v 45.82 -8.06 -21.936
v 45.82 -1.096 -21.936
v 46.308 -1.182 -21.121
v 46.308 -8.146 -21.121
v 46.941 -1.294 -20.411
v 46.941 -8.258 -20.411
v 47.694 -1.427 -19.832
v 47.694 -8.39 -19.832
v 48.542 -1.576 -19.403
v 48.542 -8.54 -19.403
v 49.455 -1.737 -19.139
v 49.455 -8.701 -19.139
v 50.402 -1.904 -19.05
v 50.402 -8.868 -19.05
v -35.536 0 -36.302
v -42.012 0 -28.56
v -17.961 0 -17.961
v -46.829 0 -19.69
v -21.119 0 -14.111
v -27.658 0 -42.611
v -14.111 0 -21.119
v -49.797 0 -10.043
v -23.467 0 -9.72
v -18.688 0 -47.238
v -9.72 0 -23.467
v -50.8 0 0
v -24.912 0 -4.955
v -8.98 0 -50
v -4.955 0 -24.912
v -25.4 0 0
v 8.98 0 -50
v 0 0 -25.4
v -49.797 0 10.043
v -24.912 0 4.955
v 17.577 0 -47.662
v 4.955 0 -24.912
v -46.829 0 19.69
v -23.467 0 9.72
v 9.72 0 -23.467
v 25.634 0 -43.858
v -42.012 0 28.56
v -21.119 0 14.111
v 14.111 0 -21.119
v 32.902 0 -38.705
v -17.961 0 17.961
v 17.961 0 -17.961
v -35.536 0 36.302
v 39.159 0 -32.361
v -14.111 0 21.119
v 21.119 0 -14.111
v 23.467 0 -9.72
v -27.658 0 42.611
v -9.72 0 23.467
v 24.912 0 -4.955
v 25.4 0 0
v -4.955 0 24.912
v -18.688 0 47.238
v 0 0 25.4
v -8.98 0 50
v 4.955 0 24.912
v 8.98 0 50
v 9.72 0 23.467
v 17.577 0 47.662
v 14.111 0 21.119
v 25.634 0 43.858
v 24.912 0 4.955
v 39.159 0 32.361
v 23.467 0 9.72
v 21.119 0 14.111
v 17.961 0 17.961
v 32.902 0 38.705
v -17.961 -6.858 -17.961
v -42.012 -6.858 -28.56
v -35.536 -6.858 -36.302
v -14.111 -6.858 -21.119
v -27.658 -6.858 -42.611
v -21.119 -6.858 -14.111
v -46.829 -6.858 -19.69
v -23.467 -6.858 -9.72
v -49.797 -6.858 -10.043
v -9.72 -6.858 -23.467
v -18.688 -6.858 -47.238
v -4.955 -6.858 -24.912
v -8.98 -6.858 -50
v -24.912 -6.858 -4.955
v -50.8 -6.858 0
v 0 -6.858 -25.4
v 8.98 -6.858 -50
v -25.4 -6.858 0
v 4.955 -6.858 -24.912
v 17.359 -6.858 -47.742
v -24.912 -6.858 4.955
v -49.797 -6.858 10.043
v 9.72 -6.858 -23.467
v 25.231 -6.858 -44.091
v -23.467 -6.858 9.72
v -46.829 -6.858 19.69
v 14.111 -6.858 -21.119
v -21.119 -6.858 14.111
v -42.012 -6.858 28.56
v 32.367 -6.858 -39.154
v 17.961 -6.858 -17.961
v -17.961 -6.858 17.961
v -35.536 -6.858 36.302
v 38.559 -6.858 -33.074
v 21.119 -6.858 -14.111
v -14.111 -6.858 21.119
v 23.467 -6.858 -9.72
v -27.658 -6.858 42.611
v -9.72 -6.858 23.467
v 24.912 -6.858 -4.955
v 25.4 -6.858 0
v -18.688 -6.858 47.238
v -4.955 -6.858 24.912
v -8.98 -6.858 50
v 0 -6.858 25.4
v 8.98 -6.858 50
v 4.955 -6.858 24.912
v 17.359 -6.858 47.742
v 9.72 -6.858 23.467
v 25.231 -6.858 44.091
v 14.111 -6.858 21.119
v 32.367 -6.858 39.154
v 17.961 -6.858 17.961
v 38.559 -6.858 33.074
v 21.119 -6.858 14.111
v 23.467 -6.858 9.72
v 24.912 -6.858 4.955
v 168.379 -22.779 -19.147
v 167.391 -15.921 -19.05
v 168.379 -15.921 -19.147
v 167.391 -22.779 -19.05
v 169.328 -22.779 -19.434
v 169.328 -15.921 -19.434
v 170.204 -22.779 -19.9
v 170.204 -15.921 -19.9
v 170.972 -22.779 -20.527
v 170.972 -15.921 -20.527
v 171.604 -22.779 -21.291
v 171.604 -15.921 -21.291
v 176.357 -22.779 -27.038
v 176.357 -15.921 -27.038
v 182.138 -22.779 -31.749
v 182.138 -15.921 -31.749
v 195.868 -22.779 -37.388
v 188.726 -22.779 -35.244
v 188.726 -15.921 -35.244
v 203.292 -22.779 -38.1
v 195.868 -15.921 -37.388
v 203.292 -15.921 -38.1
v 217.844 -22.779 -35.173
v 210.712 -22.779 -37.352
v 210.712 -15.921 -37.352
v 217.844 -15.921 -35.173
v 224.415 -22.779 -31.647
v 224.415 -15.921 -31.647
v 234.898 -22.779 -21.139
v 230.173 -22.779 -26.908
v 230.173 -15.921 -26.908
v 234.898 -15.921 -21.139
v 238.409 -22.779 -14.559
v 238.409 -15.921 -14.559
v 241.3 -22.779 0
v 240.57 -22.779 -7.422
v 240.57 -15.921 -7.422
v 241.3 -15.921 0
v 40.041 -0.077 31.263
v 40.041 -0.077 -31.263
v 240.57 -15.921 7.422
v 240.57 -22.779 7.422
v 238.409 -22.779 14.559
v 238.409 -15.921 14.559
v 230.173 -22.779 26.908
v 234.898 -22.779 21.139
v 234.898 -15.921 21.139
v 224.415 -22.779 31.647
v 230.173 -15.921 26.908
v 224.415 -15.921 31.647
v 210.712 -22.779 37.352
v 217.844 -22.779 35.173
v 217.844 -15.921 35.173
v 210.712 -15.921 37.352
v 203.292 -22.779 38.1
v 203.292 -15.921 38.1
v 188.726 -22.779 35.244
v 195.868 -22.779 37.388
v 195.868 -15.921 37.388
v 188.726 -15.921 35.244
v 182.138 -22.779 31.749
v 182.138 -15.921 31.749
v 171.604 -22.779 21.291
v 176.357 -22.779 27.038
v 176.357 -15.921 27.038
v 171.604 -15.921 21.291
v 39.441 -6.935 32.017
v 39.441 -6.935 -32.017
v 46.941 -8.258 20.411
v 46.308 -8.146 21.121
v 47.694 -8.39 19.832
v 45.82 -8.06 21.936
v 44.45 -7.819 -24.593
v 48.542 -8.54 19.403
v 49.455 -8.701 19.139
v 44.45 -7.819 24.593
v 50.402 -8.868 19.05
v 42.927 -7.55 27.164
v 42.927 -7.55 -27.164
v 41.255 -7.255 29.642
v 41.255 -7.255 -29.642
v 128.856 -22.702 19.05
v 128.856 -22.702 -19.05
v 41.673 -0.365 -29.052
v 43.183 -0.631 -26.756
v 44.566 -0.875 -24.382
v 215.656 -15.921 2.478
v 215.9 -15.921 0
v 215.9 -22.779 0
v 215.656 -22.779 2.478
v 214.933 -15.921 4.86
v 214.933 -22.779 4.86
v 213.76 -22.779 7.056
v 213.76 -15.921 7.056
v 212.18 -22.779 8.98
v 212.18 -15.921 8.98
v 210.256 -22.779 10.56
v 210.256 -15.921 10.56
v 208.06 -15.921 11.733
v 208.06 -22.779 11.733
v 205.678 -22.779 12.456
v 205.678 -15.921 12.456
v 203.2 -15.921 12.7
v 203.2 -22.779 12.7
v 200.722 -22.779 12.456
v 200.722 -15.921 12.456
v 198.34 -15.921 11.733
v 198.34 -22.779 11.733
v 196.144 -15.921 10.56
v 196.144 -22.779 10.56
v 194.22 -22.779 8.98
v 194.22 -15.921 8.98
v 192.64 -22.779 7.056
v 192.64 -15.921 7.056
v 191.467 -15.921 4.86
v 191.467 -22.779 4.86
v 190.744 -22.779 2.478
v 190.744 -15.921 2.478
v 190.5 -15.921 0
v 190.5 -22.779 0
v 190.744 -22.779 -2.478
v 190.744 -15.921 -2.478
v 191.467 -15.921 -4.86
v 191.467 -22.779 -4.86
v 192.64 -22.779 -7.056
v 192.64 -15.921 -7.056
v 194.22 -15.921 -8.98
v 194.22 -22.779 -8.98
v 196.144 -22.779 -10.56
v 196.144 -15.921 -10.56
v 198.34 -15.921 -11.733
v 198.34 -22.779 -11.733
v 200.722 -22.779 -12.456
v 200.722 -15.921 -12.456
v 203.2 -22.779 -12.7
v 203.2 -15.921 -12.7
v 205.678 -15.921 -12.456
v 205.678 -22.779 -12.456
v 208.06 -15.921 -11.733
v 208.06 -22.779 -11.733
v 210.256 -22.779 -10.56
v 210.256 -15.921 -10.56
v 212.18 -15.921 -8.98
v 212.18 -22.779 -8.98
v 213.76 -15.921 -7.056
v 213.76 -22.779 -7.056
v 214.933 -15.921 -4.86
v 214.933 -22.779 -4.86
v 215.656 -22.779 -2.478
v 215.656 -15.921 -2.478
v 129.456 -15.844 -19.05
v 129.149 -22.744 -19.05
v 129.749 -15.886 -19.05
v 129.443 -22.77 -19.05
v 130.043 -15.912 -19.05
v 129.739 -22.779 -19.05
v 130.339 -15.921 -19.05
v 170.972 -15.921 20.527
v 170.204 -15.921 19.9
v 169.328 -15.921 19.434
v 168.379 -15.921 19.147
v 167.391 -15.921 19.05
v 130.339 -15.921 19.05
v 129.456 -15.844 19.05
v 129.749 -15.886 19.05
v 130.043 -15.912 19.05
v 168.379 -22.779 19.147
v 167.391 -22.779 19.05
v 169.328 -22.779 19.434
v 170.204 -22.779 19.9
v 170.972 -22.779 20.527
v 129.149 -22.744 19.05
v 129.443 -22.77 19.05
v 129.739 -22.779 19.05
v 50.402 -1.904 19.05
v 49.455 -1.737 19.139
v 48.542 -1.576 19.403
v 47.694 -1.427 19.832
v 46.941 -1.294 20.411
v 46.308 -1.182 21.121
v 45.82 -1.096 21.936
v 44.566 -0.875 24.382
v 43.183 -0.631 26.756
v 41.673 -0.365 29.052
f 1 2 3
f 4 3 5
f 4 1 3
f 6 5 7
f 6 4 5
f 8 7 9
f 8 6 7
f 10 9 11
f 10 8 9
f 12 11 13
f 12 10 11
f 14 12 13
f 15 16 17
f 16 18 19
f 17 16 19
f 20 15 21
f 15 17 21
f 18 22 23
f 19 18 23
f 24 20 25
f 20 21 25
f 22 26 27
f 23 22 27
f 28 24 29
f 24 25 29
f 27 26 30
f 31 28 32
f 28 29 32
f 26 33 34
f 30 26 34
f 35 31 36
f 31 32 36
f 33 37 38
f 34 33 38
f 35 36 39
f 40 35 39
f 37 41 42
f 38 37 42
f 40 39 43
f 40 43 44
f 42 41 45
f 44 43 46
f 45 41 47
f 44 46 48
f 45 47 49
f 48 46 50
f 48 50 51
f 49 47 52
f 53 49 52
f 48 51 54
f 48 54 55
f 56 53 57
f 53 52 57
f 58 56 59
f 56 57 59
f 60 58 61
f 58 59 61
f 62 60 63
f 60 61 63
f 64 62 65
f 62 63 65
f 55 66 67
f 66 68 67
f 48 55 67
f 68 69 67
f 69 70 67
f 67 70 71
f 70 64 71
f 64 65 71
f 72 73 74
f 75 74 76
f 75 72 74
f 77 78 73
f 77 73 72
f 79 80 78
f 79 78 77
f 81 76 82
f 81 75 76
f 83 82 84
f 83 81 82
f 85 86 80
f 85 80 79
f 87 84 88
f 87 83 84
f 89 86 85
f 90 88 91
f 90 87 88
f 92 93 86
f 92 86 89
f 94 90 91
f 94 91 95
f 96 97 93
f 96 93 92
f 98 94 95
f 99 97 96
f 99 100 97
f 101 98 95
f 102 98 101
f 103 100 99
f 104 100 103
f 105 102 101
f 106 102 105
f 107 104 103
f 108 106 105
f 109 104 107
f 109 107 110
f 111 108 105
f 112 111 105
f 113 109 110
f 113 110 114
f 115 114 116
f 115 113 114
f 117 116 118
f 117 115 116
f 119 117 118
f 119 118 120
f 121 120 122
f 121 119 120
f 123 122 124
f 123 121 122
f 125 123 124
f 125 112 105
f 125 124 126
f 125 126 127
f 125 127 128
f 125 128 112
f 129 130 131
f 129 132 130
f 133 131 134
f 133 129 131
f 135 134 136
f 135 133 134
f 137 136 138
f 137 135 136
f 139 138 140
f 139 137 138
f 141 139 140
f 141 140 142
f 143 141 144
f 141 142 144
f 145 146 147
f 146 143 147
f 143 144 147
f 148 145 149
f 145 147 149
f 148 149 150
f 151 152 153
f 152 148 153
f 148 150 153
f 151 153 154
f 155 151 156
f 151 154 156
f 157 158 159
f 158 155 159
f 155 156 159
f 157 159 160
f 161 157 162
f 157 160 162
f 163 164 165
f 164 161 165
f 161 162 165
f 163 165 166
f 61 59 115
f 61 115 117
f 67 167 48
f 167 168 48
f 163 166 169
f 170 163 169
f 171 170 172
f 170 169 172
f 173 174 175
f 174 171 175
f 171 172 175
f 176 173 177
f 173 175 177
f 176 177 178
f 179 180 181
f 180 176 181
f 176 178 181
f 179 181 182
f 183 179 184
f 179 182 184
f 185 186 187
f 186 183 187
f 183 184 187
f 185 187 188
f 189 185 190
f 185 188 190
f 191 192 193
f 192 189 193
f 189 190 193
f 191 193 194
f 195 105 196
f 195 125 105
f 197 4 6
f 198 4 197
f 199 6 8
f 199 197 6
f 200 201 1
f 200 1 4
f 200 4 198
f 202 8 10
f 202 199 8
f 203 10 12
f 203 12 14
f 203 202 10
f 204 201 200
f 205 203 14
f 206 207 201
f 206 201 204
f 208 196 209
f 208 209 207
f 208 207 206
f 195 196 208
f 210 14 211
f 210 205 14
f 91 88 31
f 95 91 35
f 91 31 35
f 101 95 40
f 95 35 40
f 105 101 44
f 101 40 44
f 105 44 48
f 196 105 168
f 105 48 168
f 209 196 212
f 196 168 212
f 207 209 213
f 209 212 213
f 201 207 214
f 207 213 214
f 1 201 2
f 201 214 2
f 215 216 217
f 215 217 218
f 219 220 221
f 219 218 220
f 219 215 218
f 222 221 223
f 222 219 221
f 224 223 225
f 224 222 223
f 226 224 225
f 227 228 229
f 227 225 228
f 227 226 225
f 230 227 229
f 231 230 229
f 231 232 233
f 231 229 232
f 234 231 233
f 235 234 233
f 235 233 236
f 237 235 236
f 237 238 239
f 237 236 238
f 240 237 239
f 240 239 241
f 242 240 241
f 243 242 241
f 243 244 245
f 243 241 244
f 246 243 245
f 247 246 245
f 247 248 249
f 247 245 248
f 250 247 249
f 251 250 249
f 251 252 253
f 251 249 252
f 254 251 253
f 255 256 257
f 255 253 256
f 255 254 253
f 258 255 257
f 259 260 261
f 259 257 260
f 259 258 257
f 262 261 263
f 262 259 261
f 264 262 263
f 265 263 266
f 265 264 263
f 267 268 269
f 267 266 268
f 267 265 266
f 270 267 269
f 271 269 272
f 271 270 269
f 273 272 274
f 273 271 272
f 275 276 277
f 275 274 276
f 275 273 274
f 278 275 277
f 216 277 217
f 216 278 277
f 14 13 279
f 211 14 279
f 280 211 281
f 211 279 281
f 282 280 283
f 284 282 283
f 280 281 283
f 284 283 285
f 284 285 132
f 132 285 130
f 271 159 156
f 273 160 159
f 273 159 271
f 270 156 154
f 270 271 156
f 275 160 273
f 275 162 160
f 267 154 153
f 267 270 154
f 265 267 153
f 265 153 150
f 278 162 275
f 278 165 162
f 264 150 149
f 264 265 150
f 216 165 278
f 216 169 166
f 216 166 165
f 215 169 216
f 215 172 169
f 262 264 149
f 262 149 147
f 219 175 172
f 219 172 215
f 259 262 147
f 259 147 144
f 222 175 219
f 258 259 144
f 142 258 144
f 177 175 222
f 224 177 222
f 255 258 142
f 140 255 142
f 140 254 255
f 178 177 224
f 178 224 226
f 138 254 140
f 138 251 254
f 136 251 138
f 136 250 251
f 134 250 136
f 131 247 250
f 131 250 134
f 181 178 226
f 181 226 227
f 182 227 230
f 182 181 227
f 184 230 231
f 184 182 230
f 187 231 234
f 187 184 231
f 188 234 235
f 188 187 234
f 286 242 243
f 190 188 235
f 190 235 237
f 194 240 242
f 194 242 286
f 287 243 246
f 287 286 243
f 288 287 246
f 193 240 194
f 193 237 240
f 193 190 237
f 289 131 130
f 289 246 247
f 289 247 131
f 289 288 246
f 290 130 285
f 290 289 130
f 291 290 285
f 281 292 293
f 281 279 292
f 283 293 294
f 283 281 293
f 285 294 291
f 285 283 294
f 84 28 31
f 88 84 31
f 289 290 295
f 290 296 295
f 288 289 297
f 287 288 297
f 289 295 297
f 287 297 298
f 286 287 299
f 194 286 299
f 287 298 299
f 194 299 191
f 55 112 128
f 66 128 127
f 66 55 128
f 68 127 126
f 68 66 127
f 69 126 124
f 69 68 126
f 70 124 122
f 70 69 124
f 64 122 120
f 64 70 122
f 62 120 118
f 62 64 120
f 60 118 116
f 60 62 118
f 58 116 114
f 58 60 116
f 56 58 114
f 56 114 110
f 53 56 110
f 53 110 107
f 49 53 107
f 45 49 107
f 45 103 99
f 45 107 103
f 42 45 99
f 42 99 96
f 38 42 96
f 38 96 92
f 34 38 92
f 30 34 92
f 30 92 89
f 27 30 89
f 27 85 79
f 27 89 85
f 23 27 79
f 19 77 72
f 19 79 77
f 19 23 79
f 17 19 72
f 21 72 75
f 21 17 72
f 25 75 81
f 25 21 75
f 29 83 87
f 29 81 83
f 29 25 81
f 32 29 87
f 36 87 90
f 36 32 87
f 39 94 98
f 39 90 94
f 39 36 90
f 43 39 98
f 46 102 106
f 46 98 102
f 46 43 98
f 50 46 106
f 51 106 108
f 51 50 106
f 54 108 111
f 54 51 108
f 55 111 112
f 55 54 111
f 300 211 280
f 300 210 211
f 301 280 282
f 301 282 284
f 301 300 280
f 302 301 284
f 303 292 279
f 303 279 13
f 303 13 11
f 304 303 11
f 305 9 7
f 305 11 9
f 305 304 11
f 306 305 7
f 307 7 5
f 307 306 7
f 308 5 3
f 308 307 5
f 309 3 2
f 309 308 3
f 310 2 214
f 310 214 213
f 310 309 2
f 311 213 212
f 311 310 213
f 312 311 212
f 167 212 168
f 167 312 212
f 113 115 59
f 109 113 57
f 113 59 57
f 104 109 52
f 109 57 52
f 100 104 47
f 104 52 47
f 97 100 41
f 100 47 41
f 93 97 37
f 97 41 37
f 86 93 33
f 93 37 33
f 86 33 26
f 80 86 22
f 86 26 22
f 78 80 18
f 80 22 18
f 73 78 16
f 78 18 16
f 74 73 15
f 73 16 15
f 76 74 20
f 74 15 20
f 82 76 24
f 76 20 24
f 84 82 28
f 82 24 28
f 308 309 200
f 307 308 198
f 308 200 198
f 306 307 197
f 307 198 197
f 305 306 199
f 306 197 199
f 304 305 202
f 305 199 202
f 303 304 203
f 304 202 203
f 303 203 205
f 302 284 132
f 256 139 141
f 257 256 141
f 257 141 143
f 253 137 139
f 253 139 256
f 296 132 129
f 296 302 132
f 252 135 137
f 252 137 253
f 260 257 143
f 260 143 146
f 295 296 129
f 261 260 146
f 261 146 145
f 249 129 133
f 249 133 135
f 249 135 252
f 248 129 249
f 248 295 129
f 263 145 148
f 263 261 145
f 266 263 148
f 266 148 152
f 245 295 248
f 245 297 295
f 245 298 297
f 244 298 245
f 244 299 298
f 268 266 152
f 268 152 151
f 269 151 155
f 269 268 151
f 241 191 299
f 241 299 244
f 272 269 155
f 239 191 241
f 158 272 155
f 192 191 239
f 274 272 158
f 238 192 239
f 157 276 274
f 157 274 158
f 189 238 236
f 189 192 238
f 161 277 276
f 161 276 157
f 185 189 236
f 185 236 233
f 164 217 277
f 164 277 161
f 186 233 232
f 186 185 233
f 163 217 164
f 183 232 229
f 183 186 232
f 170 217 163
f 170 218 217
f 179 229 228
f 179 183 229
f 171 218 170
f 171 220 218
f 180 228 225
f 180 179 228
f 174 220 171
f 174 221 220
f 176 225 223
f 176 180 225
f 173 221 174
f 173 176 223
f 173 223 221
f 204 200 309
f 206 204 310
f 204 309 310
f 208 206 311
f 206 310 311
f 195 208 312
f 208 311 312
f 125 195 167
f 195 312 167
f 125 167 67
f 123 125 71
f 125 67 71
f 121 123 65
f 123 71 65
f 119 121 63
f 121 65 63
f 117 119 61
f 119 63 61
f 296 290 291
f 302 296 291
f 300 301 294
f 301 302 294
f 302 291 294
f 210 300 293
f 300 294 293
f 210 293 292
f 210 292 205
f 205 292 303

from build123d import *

# Parameters (mm, degrees)
F0_R     = 25.4
F0_R_2   = 12.7
F1_DEPTH = 25.4
F3_DEPTH = 50
F4_R     = 5.08


with BuildPart() as f1:
    # F0 (on Front) → F1 (new body)
    with BuildSketch(Plane.XZ):
        with BuildLine():
            ThreePointArc((47.09286, -19.05), (49.864603, -9.703677), (50.8, 0))
            ThreePointArc((50.8, 0), (49.864603, 9.703677), (47.09286, 19.05))
            ThreePointArc((47.09286, 19.05), (-50.8, 0), (47.09286, -19.05))
        make_face()
        Circle(F0_R, mode=Mode.SUBTRACT)
        with BuildLine():
            ThreePointArc((47.09286, 19.05), (49.864603, 9.703677), (50.8, 0))
            ThreePointArc((50.8, 0), (49.864603, -9.703677), (47.09286, -19.05))
            Line((47.09286, -19.05), (170.204432, -19.05))
            ThreePointArc((170.204432, -19.05), (165.1, 0), (170.204432, 19.05))
            Line((170.204432, 19.05), (47.09286, 19.05))
        make_face()
        with BuildLine():
            ThreePointArc((241.3, 0), (213.061006, 36.801774), (170.204432, 19.05))
            ThreePointArc((170.204432, 19.05), (165.1, 0), (170.204432, -19.05))
            ThreePointArc((170.204432, -19.05), (213.061006, -36.801774), (241.3, 0))
        make_face()
        with Locations((203.2, 0)):
            Circle(F0_R_2, mode=Mode.SUBTRACT)
    extrude(amount=F1_DEPTH)

    # F2 (on Top) → F3 (intersect, symmetric)
    with BuildSketch(Plane.XY):
        Polygon((39.602962, 0), (-68.855375, 0), (-68.855375, -6.858), (39.002964, -6.858), (129.294157, -22.778774), (255.28869, -22.778774), (255.28869, -15.920773), (129.894154, -15.920773), align=None)
    extrude(amount=F3_DEPTH, both=True, mode=Mode.INTERSECT)

    # F4
    f4_edges = [f1.edges().sort_by_distance(p)[0] for p in [
        (129.894154, -15.920773, 0),
        (39.602962, 0, 0),
        (39.002964, -6.858, 0),
        (129.294157, -22.778774, 0),
        (47.09286, -4.802569, 19.05),
        (170.204432, -19.349774, 19.05),
        (170.204432, -19.349774, -19.05),
        (47.09286, -4.802569, -19.05),
    ]]
    fillet(f4_edges, radius=F4_R)


solid = f1.part
